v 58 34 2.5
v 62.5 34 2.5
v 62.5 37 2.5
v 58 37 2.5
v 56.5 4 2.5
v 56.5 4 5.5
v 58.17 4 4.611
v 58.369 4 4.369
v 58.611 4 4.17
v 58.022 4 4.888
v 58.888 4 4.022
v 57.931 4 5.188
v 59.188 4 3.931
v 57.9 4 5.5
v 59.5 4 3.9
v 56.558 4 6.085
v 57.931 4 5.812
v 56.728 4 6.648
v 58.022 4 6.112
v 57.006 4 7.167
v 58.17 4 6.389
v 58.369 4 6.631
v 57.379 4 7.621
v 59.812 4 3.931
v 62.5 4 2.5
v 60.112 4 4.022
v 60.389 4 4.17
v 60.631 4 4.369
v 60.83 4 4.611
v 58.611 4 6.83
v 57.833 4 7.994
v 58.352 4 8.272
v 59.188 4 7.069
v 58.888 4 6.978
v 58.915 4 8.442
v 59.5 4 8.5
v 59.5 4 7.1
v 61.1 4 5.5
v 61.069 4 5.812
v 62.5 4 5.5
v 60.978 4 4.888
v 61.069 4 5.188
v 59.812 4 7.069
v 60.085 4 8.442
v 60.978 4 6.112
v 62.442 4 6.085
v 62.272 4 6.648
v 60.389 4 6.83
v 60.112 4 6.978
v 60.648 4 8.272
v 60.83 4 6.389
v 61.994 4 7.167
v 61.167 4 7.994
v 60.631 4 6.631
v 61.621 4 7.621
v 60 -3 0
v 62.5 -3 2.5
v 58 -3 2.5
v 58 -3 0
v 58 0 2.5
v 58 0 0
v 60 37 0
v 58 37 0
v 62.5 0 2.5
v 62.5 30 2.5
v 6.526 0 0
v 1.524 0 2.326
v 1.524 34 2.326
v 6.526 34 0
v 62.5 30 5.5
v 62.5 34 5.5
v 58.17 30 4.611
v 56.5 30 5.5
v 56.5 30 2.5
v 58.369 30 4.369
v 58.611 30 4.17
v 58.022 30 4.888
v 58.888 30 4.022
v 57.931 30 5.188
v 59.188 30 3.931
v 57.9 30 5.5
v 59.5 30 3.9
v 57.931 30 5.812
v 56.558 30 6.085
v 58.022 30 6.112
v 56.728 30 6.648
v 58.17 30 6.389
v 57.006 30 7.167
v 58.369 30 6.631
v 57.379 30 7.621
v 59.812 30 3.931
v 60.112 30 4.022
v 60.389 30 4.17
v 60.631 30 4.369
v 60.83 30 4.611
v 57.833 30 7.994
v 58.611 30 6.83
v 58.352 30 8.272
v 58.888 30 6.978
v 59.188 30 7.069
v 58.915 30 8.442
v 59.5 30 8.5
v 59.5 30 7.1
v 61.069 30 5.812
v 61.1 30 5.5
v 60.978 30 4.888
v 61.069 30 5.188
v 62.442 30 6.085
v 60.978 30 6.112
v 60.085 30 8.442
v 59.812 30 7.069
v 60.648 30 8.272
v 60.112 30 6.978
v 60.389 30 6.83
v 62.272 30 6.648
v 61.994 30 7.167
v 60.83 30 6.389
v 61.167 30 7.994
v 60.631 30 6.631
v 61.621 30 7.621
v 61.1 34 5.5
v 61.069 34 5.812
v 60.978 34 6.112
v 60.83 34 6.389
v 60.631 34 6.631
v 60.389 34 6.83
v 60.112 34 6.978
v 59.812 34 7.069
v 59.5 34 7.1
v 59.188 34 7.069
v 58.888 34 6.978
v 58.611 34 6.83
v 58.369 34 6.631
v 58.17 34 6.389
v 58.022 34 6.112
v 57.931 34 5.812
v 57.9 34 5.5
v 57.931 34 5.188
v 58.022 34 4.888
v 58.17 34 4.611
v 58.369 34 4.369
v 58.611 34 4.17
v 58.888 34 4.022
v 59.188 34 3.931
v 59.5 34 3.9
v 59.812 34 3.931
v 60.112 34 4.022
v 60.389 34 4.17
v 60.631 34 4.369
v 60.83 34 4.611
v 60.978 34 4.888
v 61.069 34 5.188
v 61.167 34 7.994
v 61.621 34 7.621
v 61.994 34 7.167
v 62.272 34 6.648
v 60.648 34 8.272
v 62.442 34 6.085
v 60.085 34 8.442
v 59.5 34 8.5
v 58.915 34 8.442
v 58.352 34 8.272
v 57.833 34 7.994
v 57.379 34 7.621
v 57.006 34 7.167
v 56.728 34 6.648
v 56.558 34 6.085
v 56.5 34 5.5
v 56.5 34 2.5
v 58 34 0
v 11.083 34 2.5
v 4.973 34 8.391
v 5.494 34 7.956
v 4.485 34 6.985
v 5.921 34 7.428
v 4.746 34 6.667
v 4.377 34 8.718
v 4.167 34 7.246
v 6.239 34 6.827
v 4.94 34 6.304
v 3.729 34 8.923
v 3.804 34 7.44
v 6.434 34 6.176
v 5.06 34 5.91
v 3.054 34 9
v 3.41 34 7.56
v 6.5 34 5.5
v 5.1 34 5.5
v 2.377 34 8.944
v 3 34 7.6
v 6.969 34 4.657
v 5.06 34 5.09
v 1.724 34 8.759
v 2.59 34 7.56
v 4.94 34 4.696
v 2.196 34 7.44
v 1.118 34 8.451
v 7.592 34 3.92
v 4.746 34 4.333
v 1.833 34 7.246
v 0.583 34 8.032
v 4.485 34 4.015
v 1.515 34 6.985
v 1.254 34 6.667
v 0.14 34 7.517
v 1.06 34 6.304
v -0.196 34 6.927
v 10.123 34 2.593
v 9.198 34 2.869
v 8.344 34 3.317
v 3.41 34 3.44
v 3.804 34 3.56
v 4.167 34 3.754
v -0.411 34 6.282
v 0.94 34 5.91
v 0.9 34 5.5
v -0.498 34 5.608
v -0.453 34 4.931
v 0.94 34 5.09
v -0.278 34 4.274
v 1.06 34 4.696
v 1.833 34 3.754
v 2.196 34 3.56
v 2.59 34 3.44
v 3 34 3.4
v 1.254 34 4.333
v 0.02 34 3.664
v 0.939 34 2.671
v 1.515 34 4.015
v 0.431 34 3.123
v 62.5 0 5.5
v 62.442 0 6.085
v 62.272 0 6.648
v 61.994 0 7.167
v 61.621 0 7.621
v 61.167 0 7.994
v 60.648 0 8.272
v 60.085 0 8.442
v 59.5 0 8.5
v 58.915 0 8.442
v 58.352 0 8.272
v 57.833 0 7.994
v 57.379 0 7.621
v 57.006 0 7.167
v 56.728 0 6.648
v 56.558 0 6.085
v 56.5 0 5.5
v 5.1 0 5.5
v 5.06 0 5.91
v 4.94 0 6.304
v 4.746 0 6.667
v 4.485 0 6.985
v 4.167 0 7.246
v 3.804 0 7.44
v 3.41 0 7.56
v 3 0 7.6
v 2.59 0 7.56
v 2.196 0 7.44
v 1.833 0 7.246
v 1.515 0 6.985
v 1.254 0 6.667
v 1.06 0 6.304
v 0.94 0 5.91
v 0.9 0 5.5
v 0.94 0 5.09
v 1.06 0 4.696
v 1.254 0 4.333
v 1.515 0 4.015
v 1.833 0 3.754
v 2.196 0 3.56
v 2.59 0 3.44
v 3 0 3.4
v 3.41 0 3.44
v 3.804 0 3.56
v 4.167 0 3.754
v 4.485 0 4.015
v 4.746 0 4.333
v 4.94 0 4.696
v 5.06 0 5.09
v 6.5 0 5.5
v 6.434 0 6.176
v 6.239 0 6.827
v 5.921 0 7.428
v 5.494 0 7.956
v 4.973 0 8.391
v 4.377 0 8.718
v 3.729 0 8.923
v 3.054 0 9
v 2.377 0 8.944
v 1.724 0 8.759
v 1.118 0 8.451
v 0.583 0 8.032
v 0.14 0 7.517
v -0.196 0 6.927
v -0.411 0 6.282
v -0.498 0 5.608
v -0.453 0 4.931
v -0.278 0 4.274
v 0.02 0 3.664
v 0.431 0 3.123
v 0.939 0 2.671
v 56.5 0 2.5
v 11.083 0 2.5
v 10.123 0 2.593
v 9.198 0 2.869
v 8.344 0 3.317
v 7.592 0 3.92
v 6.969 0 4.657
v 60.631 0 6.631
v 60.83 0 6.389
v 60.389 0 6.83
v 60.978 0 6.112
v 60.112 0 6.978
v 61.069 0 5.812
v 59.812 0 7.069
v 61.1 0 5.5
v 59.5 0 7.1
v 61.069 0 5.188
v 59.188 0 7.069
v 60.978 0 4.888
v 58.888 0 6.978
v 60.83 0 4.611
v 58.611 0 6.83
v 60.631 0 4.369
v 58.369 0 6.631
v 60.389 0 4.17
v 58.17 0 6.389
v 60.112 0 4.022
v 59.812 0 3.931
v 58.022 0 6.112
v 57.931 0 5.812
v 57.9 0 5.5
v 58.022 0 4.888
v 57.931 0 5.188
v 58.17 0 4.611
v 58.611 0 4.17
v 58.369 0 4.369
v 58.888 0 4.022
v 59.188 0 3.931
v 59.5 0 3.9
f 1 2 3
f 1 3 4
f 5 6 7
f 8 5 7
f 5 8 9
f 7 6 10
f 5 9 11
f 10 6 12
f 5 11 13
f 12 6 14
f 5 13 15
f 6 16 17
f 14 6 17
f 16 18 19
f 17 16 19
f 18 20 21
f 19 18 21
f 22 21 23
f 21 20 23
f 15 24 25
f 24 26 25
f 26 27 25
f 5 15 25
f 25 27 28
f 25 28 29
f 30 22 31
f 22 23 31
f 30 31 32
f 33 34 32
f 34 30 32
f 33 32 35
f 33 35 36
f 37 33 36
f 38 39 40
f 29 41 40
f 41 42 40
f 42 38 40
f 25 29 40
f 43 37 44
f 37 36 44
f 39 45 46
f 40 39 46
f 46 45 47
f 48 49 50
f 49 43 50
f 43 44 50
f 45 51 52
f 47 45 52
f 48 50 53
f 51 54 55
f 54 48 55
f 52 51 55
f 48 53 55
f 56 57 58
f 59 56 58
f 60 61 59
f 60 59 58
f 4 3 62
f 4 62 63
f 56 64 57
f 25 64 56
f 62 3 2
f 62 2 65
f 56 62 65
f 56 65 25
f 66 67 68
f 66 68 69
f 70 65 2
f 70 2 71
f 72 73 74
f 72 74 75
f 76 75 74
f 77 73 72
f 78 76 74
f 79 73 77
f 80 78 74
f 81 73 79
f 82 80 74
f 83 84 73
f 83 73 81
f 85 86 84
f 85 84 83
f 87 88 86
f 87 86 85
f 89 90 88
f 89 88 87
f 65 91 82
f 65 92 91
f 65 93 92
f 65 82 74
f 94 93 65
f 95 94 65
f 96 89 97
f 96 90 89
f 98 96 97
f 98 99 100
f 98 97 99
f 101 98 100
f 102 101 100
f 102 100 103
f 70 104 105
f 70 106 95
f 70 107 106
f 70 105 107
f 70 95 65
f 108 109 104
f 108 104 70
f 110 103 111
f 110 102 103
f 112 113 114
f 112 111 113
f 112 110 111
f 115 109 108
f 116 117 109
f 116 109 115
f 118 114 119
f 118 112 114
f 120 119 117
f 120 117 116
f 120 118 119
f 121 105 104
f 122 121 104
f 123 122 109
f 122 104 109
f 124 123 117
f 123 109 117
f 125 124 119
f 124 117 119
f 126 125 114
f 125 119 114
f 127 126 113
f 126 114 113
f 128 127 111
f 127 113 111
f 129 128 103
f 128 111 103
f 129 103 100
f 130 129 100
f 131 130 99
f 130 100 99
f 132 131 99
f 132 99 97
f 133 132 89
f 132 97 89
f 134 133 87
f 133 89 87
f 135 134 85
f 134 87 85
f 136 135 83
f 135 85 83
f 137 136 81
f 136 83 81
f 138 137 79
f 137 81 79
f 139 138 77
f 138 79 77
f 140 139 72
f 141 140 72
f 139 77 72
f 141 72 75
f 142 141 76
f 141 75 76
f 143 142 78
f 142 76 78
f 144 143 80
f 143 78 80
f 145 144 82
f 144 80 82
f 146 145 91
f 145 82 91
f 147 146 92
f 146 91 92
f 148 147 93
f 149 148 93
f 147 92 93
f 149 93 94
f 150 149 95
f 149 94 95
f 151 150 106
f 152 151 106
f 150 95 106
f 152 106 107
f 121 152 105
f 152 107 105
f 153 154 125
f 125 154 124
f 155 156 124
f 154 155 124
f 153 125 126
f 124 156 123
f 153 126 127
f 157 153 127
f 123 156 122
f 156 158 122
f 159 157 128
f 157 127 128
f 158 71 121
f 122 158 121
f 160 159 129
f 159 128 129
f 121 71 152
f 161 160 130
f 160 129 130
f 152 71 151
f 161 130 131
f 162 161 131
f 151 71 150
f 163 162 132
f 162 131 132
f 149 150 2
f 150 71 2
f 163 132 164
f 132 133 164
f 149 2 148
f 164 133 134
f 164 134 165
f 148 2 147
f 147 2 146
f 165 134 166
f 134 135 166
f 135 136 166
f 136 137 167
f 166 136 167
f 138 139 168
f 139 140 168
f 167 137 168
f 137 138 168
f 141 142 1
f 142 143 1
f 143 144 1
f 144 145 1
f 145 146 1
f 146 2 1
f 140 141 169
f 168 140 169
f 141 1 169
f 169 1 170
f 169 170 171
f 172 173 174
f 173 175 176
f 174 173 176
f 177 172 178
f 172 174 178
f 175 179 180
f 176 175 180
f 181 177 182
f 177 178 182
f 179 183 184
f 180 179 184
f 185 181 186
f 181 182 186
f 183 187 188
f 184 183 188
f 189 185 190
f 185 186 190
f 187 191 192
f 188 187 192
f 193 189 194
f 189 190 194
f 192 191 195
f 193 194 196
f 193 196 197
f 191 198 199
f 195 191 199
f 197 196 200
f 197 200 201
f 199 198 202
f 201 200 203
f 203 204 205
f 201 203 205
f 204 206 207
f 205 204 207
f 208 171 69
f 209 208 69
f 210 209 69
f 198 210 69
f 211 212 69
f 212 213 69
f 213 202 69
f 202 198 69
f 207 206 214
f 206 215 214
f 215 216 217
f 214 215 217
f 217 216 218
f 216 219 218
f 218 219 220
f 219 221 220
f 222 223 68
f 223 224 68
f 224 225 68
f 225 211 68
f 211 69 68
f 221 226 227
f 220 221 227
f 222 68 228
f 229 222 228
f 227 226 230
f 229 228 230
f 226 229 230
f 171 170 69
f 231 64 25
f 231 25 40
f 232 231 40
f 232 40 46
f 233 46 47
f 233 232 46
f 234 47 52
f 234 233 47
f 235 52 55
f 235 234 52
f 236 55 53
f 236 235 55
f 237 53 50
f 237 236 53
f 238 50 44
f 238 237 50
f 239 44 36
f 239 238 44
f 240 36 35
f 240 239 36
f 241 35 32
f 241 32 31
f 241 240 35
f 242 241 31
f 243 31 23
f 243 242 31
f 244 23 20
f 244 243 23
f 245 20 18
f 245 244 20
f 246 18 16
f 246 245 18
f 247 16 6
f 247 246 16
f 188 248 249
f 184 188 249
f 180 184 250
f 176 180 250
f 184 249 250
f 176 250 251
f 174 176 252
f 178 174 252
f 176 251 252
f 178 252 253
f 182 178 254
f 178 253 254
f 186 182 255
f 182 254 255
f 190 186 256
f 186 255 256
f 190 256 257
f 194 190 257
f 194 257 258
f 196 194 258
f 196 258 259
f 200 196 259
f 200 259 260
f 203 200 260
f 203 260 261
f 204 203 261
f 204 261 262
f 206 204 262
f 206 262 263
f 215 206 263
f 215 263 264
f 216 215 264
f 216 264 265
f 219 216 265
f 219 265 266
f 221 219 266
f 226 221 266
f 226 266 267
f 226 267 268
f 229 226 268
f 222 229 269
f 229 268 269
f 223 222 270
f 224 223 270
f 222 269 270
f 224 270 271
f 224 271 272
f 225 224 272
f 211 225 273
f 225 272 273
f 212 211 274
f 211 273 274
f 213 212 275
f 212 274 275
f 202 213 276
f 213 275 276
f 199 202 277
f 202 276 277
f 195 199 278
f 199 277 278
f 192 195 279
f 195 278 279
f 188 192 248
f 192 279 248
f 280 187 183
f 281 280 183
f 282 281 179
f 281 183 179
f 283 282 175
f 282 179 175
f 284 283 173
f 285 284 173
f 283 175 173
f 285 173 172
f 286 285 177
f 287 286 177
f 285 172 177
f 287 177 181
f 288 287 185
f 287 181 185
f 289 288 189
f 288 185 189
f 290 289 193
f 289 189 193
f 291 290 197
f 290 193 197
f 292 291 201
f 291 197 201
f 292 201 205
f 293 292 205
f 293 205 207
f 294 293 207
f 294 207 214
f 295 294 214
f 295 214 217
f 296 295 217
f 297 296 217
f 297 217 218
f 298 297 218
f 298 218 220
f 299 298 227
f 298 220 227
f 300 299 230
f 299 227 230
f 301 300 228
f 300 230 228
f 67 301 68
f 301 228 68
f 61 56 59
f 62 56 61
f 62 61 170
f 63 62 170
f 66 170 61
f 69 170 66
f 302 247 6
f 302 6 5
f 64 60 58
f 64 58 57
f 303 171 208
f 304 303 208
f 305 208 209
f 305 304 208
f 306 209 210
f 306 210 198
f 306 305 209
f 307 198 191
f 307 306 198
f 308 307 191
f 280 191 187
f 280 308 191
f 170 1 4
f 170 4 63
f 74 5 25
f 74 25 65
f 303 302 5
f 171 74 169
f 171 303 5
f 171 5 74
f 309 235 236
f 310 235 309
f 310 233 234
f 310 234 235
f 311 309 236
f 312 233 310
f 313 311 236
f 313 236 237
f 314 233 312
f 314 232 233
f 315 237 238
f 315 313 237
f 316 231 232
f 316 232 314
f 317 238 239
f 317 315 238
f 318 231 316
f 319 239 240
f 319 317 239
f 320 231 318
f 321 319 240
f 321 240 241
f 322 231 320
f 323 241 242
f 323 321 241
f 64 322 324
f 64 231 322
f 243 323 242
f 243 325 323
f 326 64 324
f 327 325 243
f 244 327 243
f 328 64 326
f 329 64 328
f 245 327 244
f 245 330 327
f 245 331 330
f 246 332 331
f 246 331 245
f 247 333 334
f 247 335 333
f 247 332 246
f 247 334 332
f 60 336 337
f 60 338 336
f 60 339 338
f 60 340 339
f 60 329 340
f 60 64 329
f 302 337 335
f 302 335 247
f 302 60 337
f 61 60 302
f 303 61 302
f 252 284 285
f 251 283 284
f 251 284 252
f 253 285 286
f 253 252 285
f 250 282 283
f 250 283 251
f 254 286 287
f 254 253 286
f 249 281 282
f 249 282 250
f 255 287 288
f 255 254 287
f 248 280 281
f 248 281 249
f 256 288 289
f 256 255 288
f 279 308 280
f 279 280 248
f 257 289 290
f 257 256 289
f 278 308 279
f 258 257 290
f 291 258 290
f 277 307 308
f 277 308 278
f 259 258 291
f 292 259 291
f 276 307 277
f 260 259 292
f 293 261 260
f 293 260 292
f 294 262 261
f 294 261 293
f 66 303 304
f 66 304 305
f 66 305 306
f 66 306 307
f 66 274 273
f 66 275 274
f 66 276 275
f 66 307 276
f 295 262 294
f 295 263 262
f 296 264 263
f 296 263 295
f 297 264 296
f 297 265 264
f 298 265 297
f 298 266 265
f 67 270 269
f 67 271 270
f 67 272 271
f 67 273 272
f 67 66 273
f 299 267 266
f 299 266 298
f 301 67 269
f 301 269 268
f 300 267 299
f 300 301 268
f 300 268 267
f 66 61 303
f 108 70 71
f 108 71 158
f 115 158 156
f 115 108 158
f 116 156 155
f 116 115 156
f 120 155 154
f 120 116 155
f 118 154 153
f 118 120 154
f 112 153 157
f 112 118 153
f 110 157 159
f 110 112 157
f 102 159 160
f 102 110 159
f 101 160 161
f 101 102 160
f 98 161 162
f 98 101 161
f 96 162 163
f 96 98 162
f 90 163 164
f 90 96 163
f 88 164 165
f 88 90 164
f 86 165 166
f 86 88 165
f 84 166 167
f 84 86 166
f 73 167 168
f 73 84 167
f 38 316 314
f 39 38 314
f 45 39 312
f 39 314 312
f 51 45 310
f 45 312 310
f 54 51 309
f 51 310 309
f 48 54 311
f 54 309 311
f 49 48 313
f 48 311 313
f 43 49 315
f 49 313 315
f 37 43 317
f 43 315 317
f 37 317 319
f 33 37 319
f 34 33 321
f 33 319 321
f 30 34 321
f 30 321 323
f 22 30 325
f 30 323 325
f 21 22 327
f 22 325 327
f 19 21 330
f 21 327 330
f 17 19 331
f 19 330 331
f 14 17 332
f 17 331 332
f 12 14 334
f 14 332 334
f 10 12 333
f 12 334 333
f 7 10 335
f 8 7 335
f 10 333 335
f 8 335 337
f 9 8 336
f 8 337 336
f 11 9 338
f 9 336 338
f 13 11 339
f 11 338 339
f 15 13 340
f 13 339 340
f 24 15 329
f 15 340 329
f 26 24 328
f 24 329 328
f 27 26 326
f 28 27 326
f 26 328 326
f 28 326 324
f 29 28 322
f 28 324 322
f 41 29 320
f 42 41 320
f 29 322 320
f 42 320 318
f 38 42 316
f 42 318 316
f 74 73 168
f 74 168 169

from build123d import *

# Parameters (mm, degrees)
SKETCH_1_W                  = 60
SKETCH_1_H                  = 34
EXTRUDE_1_DEPTH             = 2.5
SKETCH_3_R                  = 3
SKETCH_3_R_2                = 1.6
EXTRUDE_2_DEPTH             = 4
PATTERN_LINEAR_1_COUNT      = 2
PATTERN_LINEAR_1_PITCH      = 56.5
PATTERN_LINEAR_1_COUNT_DIR2 = 2
PATTERN_LINEAR_1_PITCH_DIR2 = 30
SKETCH_5_W                  = 2.5
SKETCH_5_H                  = 34
EXTRUDE_3_DEPTH             = 4
SKETCH_6_W                  = 2.5
SKETCH_6_H                  = 34
EXTRUDE_4_DEPTH             = 4
CUT_EXTRUDE_1_DEPTH         = 73.9674585
EXTRUDE_13_REACH            = 73.192
SKETCH_8_R                  = 1.6
CUT_EXTRUDE_2_DEPTH         = 73.9674585
EXTRUDE_START               = -34
EXTRUDE_14_DEPTH            = 34
SKETCH_10_W                 = 1.5
SKETCH_10_H                 = 2.5
CUT_EXTRUDE_3_DEPTH         = 34
CUT_EXTRUDE_4_DEPTH         = 72.655425475
CUT_EXTRUDE_4_DEPTH_BACK    = 72.655425475
EXTRUDE_16_DEPTH            = 3
EXTRUDE_17_DEPTH            = 3
SKETCH_15_R                 = 2.1
CUT_EXTRUDE_6_DEPTH         = 74.126602547
EXTRUDE_18_DEPTH            = 34
FILLET_1_R                  = 5


# Read off the part's stored shape, not the designer's step: 凸台-拉伸18
with BuildPart() as part:
    # 草图1 → 凸台-拉伸1 (new body)
    with BuildSketch(Plane.XY):
        with Locations((30, 17)):
            Rectangle(SKETCH_1_W, SKETCH_1_H)
    extrude(amount=EXTRUDE_1_DEPTH)

    # 草图3 → 凸台-拉伸2 (add)
    # profile 1 of 3: a face of its own
    with BuildSketch(Plane.XZ):
        with BuildLine():
            Line((6, 2.5), (6, 5.5))
            ThreePointArc((6, 5.5), (5.121320344, 3.378679656), (3, 2.5))
            Line((3, 2.5), (6, 2.5))
        make_face()
    # profile 2 of 3: a face of its own
    with BuildSketch(Plane.XZ):
        with BuildLine():
            ThreePointArc((3, 2.5), (0.878679656, 3.378679656), (0, 5.5))
            Line((0, 5.5), (0, 2.5))
            Line((0, 2.5), (3, 2.5))
        make_face()
    # profile 3 of 3: a face of its own
    with BuildSketch(Plane.XZ):
        with Locations((3, 5.5)):
            Circle(SKETCH_3_R)
        with Locations((3, 5.5)):
            Circle(SKETCH_3_R_2, mode=Mode.SUBTRACT)
    extrude_2 = extrude(amount=-EXTRUDE_2_DEPTH)

    # 阵列(线性)1: Extrude 2 2 × 2
    with Locations(*[(i * PATTERN_LINEAR_1_PITCH, j * PATTERN_LINEAR_1_PITCH_DIR2, 0) for i in range(PATTERN_LINEAR_1_COUNT) for j in range(PATTERN_LINEAR_1_COUNT_DIR2) if (i, j) != (0, 0)]):
        add(extrude_2)

    # 草图5 → 凸台-拉伸3 (add)
    with BuildSketch(Plane.ZY):
        with Locations((1.25, 17)):
            Rectangle(SKETCH_5_W, SKETCH_5_H)
    extrude(amount=EXTRUDE_3_DEPTH)

    # 草图6 → 凸台-拉伸4 (add)
    with BuildSketch(Plane(origin=(60, 0, 0), x_dir=(0, 0, -1), z_dir=(1, 0, 0))):
        with Locations((-1.25, 17)):
            Rectangle(SKETCH_6_W, SKETCH_6_H)
    extrude(amount=EXTRUDE_4_DEPTH)

    # 草图7 → 切除-拉伸1 (cut, through all)
    with BuildSketch(Plane(origin=(0, 34, 0), x_dir=(1, 0, 0), z_dir=(0, 1, 0))):
        with BuildLine():
            ThreePointArc((0, -5.5), (0.878679656, -3.378679656), (3, -2.5))
            Line((3, -2.5), (3, 0))
            Line((3, 0), (-4, 0))
            Line((-4, 0), (-4, -2.5))
            Line((-4, -2.5), (0, -2.5))
            Line((0, -2.5), (0, -5.5))
        make_face()
    extrude(amount=-CUT_EXTRUDE_1_DEPTH, mode=Mode.SUBTRACT)

    # 草图8 → 凸台-拉伸13 (add, up to next)
    with BuildSketch(Plane(origin=(0, 4, 0), x_dir=(1, 0, 0), z_dir=(0, 1, 0)), mode=Mode.PRIVATE) as extrude_13_sk1:
        with BuildLine():
            ThreePointArc((3, -2.5), (0.878679656, -7.621320344), (6, -5.5))
            ThreePointArc((6, -5.5), (5.121320344, -3.378679656), (3, -2.5))
        make_face()
        with Locations((3, -5.5)):
            Circle(SKETCH_8_R, mode=Mode.SUBTRACT)
    extrude_13_tool1 = extrude(extrude_13_sk1.sketch, amount=EXTRUDE_13_REACH, mode=Mode.PRIVATE) - part.part
    # 草图8 → 凸台-拉伸13 (add, up to next)
    with BuildSketch(Plane(origin=(0, 4, 0), x_dir=(1, 0, 0), z_dir=(0, 1, 0)), mode=Mode.PRIVATE) as extrude_13_sk2:
        with BuildLine():
            ThreePointArc((3, -2.5), (5.121320344, -3.378679656), (6, -5.5))
            Line((6, -5.5), (6, -2.5))
            Line((6, -2.5), (3, -2.5))
        make_face()
    extrude_13_tool2 = extrude(extrude_13_sk2.sketch, amount=EXTRUDE_13_REACH, mode=Mode.PRIVATE) - part.part
    add(extrude_13_tool1.solids().sort_by_distance((5.06132, 4, 3.43868))[0])
    add(extrude_13_tool2.solids().sort_by_distance((5.329896, 4, 3.170104))[0])

    # 草图9 → 切除-拉伸2 (cut, through all)
    with BuildSketch(Plane(origin=(0, 34, 0), x_dir=(1, 0, 0), z_dir=(0, 1, 0))):
        Polygon((3, 0), (3, -2.035898385), (6.526279442, 0), align=None)
    extrude(amount=-CUT_EXTRUDE_2_DEPTH, mode=Mode.SUBTRACT)

    # 草图9<3> → 凸台-拉伸14 (add)
    with BuildSketch(Plane(origin=(0, 34, 0), x_dir=(1, 0, 0), z_dir=(0, 1, 0)).offset(EXTRUDE_START)):
        Polygon((6, -2.5), (6, -3.190598923), (7.196152423, -2.5), align=None)
        with BuildLine():
            Line((3, -2.035898385), (1.5, -2.901923789))
            ThreePointArc((1.5, -2.901923789), (2.223542865, -2.602222521), (3, -2.5))
            Line((3, -2.5), (3, -2.035898385))
        make_face()
    extrude(amount=EXTRUDE_14_DEPTH)

    # 草图10 → 切除-拉伸3 (cut)
    with BuildSketch(Plane(origin=(0, 34, 0), x_dir=(1, 0, 0), z_dir=(0, 1, 0))):
        with Locations((63.25, -1.25)):
            Rectangle(SKETCH_10_W, SKETCH_10_H)
    extrude(amount=-CUT_EXTRUDE_3_DEPTH, mode=Mode.SUBTRACT)

    # 草图11 → 切除-拉伸4 (cut, two sides: drawn at the far end of the back side and taken through both)
    with BuildSketch(Plane(origin=(0, 34, 0), x_dir=(1, 0, 0), z_dir=(0, 1, 0)).offset(-CUT_EXTRUDE_4_DEPTH_BACK)):
        Polygon((60, 0), (62.5, -2.5), (62.5, 0), align=None)
    extrude(amount=CUT_EXTRUDE_4_DEPTH + CUT_EXTRUDE_4_DEPTH_BACK, mode=Mode.SUBTRACT)

    # 草图13 → 凸台-拉伸16 (add)
    with BuildSketch(Plane(origin=(0, 34, 0), x_dir=(1, 0, 0), z_dir=(0, 1, 0))):
        Polygon((62.5, -2.5), (58, -2.5), (58, 0), (60, 0), align=None)
    extrude(amount=EXTRUDE_16_DEPTH)

    # 草图14 → 凸台-拉伸17 (add)
    with BuildSketch(Plane.XZ):
        Polygon((62.5, 2.5), (60, 0), (58, 0), (58, 2.5), align=None)
    extrude(amount=EXTRUDE_17_DEPTH)

    # 草图15 → 切除-拉伸6 (cut, through all)
    with BuildSketch(Plane.XZ):
        with Locations((3, 5.5)):
            Circle(SKETCH_15_R)
    extrude(amount=-CUT_EXTRUDE_6_DEPTH, mode=Mode.SUBTRACT)

    # 凸台-拉伸18 outline → 凸台-拉伸18 (add)
    with BuildSketch(Plane(origin=(0, 0, 0), x_dir=(-1, 0, 0), z_dir=(0, -1, 0)).offset(EXTRUDE_START)):
        with BuildLine():
            Line((-7.196152423, -2.5), (-6.5, -5.5))
            ThreePointArc((-6.5, -5.5), (-1.117959969, -8.450919402), (-1.524042675, -2.32642946))
            Line((-1.524042675, -2.32642946), (-6.526279442, 0))
            Line((-6.526279442, 0), (-1.5, -2.901923789))
            ThreePointArc((-1.5, -2.901923789), (-1.5, -8.098076211), (-6, -5.5))
            Line((-6, -5.5), (-6, -3.190598923))
            Line((-6, -3.190598923), (-7.196152423, -2.5))
        make_face()
    extrude(amount=EXTRUDE_18_DEPTH)

    # 圆角1
    # the kernel refuses this fillet: 5 mm, written as the material it adds along each edge
    with BuildSketch(Plane(origin=(7.196152423, 0, 2.5), x_dir=(1, 0, 0), z_dir=(0, 1, 0))) as fillet_1_piece_1:
        with BuildLine():
            CenterArc((3.886423272, -5), FILLET_1_R, 90, 66.421821522)
            Line((-0.696152423, -3), (-0.787803937, -2.96))
            ThreePointArc((-0.787803937, -2.96), (-0.445487906, -1.477395538), (-0.097411695, 0.022604462))
            Line((-0.097411695, 0.022604462), (0, 0.1))
            Line((0, 0.1), (3.886423272, 0.1))
            Line((3.886423272, 0.1), (3.886423272, 0))
        make_face()
    extrude(amount=34)


solid = part.part
